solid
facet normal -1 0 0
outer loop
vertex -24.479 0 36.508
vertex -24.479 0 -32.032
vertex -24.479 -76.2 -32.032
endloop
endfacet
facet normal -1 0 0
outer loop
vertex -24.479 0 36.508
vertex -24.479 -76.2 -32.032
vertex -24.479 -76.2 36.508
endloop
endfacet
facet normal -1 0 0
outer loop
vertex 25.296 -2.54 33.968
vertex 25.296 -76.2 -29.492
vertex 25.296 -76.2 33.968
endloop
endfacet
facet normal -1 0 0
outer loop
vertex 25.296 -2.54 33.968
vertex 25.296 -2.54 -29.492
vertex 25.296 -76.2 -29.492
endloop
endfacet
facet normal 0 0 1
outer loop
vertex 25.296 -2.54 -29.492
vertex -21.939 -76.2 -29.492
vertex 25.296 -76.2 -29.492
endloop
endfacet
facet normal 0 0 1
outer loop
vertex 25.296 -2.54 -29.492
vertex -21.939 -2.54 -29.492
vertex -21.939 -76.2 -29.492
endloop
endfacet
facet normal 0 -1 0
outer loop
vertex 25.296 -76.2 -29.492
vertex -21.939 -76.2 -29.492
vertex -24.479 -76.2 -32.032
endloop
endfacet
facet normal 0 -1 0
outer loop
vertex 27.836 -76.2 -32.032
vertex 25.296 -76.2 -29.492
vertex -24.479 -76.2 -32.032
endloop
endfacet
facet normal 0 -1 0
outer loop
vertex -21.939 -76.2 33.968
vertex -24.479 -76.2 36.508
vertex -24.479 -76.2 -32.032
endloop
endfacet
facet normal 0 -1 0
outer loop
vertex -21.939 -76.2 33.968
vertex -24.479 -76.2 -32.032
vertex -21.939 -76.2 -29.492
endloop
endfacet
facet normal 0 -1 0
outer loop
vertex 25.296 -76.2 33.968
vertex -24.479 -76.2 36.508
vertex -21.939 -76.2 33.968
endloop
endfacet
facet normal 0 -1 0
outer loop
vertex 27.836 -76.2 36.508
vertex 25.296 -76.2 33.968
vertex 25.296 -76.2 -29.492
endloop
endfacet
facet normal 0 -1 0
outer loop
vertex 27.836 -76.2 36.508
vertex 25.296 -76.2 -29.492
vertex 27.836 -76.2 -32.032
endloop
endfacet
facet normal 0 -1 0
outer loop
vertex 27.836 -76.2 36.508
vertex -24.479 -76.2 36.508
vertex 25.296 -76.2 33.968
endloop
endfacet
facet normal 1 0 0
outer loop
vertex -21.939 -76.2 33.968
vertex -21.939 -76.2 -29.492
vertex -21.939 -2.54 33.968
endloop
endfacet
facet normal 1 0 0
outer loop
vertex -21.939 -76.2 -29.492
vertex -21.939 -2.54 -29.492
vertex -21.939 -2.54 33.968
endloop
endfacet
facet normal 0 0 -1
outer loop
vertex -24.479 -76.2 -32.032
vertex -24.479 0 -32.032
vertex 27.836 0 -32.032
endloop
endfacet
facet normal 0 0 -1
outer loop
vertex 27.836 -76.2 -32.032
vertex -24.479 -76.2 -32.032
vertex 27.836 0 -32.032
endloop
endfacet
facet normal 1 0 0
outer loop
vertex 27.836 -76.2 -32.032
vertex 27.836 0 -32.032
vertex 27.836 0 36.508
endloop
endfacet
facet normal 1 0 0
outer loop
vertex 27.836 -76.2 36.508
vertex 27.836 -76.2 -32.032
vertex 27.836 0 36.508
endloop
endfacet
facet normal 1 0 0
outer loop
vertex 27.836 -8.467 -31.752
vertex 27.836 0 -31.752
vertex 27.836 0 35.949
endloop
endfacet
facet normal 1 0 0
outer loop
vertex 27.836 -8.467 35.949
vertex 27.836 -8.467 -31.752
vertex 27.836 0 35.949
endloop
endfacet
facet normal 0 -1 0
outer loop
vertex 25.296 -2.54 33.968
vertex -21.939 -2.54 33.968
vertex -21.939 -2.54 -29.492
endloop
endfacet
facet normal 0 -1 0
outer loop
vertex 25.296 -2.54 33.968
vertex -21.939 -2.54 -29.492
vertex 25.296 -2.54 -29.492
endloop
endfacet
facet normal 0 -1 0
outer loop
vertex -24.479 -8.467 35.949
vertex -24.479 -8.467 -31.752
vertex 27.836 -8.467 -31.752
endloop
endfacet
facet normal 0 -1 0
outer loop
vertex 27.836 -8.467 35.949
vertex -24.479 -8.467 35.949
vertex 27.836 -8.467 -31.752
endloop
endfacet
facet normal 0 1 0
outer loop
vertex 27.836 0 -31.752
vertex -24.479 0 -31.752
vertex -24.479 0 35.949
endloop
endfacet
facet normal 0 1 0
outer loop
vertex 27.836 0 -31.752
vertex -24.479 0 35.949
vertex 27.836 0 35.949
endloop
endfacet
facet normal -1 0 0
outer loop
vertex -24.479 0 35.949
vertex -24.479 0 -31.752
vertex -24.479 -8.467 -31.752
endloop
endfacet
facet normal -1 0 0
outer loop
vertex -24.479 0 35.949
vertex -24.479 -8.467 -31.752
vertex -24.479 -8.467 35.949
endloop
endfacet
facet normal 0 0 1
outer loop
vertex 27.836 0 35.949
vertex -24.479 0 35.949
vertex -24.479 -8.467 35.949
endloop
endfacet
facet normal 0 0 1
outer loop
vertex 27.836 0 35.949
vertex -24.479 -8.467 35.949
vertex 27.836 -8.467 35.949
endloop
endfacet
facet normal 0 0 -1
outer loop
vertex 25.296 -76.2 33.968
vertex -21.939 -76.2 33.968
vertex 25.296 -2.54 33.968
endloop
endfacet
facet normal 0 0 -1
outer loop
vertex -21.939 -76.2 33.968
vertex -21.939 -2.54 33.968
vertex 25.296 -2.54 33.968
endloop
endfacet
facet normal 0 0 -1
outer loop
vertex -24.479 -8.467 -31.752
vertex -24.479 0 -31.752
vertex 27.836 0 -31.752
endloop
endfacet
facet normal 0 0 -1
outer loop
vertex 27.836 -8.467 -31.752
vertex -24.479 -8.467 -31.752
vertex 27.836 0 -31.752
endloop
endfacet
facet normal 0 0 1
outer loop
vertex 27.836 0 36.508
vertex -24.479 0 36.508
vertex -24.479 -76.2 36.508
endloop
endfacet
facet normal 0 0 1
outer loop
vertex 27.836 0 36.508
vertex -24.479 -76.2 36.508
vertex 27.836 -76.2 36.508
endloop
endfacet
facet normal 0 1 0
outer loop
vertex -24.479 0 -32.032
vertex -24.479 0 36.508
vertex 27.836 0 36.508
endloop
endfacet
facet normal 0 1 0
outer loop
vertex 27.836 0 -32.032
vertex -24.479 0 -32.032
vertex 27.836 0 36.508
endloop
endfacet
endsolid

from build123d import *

# Parameters (mm, degrees)
F0_W     = 52.314232
F0_H     = 68.540037
F1_DEPTH = 76.2
F2_T     = -2.54
F3_W     = 52.314232
F3_H     = 67.700769
F4_DEPTH = 8.466667


with BuildPart() as f1:
    # F0 (on Front) → F1 (new body)
    with BuildSketch(Plane.XZ):
        with Locations((1.678531, 2.238042)):
            Rectangle(F0_W, F0_H)
    extrude(amount=F1_DEPTH)

    # F2
    f2_openings = [f1.faces().sort_by_distance(p)[0] for p in [
        (1.678531, -76.2, 2.238043),
    ]]
    offset(amount=F2_T, openings=f2_openings)


with BuildPart() as f4:
    # F3 (on Front) → F4 (new body)
    with BuildSketch(Plane.XZ):
        with Locations((1.678531, 2.098163)):
            Rectangle(F3_W, F3_H)
    extrude(amount=F4_DEPTH)


solid = Compound([f1.part, f4.part])
